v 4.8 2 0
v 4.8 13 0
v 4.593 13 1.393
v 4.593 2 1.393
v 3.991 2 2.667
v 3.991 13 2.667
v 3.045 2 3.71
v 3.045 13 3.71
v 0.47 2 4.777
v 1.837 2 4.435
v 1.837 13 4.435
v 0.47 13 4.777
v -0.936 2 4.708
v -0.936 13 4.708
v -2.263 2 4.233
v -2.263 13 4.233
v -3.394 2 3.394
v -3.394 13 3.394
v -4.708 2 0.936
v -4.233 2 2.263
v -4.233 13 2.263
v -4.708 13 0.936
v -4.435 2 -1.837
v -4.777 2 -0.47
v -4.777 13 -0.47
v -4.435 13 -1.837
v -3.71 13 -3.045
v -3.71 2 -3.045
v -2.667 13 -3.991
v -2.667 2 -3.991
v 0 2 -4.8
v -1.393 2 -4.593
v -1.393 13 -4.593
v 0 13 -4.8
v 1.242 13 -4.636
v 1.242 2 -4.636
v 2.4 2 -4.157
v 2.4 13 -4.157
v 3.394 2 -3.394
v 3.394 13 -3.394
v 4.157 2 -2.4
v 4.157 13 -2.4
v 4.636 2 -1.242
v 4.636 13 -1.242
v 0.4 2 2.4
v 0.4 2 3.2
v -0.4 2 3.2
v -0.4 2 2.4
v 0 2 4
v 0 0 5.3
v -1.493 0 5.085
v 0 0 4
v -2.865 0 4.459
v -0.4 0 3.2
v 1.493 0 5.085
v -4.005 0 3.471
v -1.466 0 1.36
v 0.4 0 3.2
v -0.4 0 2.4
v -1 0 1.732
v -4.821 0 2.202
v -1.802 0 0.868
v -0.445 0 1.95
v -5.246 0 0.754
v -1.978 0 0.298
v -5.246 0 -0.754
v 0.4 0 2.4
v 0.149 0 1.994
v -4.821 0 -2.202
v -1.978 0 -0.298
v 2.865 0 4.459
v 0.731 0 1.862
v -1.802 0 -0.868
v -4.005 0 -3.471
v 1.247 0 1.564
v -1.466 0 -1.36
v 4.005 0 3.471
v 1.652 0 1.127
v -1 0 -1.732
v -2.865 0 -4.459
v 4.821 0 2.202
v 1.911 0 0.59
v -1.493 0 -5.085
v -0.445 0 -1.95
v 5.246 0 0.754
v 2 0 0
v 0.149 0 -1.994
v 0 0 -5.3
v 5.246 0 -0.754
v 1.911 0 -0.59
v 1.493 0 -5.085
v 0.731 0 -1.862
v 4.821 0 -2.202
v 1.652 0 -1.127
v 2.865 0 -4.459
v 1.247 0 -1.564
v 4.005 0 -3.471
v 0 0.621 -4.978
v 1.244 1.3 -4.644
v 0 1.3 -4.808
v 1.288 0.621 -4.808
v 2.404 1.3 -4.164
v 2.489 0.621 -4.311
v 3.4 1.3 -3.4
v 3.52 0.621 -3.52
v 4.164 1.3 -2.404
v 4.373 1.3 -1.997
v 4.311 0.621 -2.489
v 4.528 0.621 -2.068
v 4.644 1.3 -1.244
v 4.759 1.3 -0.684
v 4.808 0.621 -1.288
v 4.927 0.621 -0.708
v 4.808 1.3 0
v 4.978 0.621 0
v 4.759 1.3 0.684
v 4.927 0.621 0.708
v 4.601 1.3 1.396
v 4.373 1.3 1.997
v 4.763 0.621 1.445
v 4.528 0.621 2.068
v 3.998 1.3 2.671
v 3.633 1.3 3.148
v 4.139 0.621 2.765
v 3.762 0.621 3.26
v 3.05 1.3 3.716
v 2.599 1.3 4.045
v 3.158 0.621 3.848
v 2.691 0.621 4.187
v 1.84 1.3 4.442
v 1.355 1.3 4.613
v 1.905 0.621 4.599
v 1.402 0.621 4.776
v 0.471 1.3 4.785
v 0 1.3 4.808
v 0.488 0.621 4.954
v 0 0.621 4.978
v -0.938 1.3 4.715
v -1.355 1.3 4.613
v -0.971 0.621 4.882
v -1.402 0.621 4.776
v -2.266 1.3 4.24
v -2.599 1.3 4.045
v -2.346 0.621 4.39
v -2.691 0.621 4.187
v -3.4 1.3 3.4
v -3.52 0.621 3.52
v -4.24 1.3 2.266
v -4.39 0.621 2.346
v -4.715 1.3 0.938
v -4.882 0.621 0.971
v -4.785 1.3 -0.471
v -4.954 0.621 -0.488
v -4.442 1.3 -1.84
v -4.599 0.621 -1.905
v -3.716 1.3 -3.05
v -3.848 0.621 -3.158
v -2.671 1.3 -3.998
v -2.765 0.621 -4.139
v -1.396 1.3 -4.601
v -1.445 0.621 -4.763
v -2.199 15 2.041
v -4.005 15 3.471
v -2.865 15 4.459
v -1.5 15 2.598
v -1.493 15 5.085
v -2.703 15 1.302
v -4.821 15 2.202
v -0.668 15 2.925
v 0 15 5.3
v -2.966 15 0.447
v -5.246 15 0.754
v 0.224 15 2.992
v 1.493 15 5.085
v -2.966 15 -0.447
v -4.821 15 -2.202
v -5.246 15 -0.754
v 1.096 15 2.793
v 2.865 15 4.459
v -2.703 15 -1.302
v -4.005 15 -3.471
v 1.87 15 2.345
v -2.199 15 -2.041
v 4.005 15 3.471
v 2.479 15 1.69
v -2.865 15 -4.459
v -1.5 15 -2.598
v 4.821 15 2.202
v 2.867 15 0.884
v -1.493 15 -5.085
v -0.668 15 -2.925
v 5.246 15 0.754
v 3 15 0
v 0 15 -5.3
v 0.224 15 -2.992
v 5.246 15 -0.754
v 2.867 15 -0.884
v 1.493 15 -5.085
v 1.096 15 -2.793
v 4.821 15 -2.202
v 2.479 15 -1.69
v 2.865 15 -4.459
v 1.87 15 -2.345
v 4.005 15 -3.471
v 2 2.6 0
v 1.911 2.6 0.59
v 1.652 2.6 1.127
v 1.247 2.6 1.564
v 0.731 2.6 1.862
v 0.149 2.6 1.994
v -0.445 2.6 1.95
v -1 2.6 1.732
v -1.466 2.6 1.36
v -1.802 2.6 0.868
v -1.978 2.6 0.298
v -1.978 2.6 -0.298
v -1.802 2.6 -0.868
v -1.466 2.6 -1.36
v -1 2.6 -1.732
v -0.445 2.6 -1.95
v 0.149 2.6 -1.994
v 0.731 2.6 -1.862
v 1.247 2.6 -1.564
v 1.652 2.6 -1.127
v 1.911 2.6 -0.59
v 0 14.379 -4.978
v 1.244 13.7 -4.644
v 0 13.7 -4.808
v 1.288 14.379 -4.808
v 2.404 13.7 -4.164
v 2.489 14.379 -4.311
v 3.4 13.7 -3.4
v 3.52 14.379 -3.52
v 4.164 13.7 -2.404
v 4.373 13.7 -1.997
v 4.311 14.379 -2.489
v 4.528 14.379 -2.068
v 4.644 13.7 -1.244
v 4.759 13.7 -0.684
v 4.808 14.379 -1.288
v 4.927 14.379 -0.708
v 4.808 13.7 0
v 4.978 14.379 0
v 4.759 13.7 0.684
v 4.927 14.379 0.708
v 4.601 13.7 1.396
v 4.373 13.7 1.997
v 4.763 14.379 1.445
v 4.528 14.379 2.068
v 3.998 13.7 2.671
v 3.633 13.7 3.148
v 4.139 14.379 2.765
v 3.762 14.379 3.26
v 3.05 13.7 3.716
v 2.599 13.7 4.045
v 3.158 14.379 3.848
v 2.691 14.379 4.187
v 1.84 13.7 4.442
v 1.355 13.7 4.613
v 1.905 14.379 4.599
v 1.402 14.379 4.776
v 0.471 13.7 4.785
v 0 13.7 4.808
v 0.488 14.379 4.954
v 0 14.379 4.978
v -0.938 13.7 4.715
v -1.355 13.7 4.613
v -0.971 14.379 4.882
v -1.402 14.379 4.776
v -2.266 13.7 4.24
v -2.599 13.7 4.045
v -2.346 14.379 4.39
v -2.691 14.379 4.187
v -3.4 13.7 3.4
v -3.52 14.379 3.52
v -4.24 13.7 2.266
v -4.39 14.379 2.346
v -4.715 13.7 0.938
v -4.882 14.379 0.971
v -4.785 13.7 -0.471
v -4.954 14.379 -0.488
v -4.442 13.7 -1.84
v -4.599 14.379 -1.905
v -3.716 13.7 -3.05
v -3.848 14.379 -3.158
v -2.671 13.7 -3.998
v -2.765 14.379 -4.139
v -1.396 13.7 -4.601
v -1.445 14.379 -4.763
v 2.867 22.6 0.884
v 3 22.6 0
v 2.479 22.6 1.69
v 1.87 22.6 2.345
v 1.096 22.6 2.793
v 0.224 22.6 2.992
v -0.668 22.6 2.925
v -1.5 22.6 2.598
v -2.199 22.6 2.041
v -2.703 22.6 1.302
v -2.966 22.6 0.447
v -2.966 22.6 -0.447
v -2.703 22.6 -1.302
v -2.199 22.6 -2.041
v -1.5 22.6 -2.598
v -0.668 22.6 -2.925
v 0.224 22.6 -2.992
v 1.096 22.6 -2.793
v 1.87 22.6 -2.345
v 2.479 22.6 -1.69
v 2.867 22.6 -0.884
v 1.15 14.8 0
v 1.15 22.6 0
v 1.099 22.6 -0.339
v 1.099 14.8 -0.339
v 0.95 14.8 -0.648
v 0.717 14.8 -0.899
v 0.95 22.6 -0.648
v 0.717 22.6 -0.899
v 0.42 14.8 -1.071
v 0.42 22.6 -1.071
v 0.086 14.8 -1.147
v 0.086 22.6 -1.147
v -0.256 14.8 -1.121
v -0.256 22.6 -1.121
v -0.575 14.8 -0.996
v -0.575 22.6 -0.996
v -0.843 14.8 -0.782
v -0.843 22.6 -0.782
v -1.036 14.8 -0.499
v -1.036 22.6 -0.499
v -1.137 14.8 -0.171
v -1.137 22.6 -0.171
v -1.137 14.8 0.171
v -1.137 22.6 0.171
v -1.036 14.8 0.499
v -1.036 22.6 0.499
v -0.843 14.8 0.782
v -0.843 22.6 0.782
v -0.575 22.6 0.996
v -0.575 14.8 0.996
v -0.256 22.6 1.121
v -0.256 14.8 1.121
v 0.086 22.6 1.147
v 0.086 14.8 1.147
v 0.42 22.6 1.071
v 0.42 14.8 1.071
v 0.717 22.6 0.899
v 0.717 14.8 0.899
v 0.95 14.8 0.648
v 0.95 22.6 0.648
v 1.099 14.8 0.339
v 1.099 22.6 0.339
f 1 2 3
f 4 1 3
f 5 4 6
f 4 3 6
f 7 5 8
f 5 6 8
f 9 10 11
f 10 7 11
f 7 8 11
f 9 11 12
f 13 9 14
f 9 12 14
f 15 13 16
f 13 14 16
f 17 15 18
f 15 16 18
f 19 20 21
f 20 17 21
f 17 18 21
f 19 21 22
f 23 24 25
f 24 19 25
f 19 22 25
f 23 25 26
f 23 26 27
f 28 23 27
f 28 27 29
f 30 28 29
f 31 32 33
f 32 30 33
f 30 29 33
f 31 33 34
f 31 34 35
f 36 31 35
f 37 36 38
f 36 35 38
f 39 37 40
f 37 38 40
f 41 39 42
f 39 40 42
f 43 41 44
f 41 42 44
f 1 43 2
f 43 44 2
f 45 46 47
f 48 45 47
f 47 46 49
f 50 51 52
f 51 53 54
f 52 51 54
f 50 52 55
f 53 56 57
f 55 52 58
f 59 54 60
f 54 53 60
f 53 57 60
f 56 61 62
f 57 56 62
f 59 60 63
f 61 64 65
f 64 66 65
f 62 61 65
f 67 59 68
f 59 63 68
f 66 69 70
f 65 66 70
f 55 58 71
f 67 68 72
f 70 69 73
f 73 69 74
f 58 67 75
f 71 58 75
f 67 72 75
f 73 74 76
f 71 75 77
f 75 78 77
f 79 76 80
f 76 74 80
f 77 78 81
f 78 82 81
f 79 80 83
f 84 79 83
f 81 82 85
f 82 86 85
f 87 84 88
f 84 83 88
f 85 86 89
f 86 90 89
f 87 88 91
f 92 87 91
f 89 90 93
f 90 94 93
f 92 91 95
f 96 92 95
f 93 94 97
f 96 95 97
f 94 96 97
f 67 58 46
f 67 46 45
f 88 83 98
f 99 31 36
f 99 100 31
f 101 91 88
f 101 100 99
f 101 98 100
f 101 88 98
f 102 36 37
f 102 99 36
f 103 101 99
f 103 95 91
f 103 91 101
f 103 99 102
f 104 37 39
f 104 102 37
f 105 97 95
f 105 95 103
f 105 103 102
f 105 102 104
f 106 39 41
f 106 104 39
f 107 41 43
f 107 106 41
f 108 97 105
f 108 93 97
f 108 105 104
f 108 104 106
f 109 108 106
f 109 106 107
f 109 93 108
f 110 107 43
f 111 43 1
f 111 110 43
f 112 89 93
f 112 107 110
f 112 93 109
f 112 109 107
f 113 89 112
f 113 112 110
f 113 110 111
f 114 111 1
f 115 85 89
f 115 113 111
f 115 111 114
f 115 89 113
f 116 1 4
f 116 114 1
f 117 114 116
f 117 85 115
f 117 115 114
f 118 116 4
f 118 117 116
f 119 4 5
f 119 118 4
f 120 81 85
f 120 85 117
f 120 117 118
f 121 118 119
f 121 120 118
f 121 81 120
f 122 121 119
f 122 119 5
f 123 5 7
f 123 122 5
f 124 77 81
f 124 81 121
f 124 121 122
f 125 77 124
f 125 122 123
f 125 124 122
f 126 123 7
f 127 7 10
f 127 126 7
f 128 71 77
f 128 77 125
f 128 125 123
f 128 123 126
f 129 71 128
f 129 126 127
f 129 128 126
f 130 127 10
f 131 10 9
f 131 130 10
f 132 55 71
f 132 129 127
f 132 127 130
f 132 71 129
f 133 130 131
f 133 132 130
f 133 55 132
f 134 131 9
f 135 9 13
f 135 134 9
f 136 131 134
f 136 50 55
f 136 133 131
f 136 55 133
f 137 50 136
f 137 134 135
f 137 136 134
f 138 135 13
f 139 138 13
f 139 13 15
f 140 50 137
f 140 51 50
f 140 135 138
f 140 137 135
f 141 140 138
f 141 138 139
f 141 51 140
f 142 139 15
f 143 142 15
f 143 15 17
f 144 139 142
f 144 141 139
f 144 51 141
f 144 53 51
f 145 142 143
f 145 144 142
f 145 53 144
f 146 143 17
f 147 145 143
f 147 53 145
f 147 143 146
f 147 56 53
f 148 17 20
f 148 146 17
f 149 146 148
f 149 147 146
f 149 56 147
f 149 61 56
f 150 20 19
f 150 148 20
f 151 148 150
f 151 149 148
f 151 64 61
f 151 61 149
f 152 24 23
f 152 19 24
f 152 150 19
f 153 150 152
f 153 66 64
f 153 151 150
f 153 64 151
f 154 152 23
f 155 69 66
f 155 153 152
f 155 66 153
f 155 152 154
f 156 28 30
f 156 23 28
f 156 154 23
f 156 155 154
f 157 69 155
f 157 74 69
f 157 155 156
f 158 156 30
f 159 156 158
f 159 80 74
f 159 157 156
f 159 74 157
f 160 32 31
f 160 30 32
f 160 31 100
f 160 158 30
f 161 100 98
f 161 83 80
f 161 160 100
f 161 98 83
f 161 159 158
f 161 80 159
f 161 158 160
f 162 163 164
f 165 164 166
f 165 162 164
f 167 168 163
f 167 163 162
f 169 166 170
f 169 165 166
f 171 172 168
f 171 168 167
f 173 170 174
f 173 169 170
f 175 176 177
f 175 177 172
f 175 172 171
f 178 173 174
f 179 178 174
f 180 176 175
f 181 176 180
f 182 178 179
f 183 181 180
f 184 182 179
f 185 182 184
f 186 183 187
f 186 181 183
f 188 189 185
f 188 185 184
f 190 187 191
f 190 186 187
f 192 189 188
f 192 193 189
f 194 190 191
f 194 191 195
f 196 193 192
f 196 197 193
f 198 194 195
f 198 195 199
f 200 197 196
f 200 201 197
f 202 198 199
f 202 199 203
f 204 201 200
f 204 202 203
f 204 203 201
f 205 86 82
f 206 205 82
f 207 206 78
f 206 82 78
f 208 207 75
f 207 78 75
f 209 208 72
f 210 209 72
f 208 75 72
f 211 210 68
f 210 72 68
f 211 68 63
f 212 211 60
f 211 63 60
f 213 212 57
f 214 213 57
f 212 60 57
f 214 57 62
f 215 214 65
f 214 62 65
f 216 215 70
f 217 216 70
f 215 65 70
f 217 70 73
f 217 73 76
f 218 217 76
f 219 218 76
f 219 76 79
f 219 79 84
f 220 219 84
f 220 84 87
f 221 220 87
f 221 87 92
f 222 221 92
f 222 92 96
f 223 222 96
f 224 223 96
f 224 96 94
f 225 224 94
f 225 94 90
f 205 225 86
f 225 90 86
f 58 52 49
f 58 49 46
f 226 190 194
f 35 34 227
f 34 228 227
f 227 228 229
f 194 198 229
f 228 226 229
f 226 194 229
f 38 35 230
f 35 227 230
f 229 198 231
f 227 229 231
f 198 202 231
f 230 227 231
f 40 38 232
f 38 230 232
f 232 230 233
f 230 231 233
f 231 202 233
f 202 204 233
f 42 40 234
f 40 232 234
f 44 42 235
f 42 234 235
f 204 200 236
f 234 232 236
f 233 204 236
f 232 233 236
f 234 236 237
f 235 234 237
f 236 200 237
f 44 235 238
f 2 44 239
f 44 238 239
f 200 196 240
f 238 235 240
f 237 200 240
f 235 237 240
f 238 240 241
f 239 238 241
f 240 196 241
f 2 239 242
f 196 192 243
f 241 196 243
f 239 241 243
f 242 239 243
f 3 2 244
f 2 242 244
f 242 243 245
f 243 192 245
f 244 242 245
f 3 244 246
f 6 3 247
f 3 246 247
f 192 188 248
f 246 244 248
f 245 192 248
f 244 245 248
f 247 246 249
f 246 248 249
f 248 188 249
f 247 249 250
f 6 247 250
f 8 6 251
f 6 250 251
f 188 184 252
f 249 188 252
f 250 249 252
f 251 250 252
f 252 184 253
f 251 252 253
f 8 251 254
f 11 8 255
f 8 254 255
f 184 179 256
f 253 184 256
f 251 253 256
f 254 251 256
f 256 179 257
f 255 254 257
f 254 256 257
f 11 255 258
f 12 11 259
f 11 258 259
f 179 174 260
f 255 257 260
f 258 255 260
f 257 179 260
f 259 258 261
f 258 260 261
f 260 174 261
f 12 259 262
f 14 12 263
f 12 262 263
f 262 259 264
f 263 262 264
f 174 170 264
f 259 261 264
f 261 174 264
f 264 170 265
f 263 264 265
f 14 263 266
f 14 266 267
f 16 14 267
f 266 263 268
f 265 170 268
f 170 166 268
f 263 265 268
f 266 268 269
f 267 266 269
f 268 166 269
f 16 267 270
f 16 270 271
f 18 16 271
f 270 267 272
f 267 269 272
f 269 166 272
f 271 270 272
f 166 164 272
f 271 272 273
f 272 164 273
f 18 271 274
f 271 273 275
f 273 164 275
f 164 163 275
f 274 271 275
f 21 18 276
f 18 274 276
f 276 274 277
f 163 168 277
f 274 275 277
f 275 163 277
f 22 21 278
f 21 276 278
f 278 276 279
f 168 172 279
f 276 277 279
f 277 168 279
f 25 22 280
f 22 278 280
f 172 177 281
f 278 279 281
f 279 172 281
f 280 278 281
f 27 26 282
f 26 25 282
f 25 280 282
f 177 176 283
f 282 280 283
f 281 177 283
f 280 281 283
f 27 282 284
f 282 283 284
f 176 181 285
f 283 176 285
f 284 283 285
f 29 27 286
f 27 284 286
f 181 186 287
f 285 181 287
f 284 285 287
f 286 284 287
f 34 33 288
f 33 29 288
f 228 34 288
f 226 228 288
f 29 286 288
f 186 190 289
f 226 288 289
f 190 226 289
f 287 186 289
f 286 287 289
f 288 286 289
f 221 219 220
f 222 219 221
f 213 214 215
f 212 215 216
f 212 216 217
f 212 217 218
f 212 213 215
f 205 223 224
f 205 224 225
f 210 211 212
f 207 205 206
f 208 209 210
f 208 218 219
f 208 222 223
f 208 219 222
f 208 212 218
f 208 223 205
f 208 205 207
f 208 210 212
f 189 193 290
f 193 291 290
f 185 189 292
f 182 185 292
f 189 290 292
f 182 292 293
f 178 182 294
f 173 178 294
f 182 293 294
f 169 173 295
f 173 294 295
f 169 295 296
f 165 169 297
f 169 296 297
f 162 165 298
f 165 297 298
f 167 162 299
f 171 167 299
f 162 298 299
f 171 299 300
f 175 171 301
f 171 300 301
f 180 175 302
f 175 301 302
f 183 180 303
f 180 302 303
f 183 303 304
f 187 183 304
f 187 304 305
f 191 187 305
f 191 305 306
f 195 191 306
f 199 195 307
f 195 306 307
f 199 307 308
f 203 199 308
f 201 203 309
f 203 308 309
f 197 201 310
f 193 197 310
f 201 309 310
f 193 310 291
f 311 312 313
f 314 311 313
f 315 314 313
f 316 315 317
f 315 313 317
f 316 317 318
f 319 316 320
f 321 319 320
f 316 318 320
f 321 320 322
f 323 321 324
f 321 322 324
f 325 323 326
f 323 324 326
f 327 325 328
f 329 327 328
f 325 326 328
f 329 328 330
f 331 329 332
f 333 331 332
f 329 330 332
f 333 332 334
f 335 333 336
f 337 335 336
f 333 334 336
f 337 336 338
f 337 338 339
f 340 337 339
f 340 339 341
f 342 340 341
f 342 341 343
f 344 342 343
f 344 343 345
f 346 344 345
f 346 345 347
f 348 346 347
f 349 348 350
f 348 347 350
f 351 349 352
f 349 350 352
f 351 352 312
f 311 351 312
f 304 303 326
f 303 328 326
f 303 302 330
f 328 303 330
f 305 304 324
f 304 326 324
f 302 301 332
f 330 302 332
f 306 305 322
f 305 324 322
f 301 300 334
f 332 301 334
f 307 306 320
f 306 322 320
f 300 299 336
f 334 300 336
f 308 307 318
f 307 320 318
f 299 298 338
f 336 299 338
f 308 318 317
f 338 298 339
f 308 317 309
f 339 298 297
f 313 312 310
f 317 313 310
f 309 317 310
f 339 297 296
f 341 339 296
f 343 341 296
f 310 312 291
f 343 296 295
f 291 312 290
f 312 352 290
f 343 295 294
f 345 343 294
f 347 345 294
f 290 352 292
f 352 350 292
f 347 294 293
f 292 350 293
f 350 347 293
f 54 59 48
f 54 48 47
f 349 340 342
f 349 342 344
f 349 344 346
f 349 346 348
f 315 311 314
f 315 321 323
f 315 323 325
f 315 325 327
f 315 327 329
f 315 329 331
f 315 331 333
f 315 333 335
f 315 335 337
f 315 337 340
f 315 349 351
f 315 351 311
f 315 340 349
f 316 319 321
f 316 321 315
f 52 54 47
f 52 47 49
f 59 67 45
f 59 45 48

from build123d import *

# Parameters (mm, degrees)
CROQUIS7_R              = 5.3
SALIENTE_EXTRUIR1_DEPTH = 2
CORTAR_EXTRUIR1_START   = 7.6
CROQUIS3_R              = 1.15
CORTAR_EXTRUIR1_DEPTH   = 7.8
CROQUIS4_R              = 2
CORTAR_EXTRUIR2_DEPTH   = 2.6
CORTAR_EXTRUIR4_DEPTH   = 2


with BuildPart() as part:
    # Croquis1 → Revolución2 (revolve)
    with BuildSketch(Plane.XY):
        Polygon((4.8, 15), (3, 15), (3, 22.6), (0, 22.6), (0, 0), (4.8, 0), align=None)
    revolve(axis=Axis((0, 55, 0), (0, -1, 0)))

    # Croquis7 → Saliente-Extruir1 (add)
    with BuildSketch(Plane(origin=(0, 15, 0), x_dir=(1, 0, 0), z_dir=(0, 1, 0))):
        Circle(CROQUIS7_R)
    saliente_extruir1 = extrude(amount=-SALIENTE_EXTRUIR1_DEPTH)

    # Croquis3 → Cortar-Extruir1 (cut)
    with BuildSketch(Plane(origin=(0, 15, 0), x_dir=(1, 0, 0), z_dir=(0, 1, 0)).offset(CORTAR_EXTRUIR1_START)):
        Circle(CROQUIS3_R)
    extrude(amount=-CORTAR_EXTRUIR1_DEPTH, mode=Mode.SUBTRACT)

    # Croquis8 → Cortar-Revolución2 (revolve, cut)
    with BuildSketch(Plane(origin=(0, 0, 0), x_dir=(0, 0, -1), z_dir=(1, 0, 0))):
        with BuildLine():
            Line((5.3, 15), (5.3, 13))
            Line((5.3, 13), (4.8, 13))
            ThreePointArc((4.8, 13), (4.872810183, 14.044297454), (5.3, 15))
        make_face()
    cortar_revoluci_n2 = revolve(axis=Axis((0, 55, 0), (0, -1, 0)), mode=Mode.SUBTRACT)

    # Simetría1: Saliente-Extruir1, Cortar-Revolución2 across plane
    add(saliente_extruir1.mirror(Plane(origin=(0, 7.5, 0), x_dir=(0, 0, 1), z_dir=(0, -1, 0))))
    add(cortar_revoluci_n2.mirror(Plane(origin=(0, 7.5, 0), x_dir=(0, 0, 1), z_dir=(0, -1, 0))), mode=Mode.SUBTRACT)

    # Croquis4 → Cortar-Extruir2 (cut)
    with BuildSketch(Plane.XZ):
        Circle(CROQUIS4_R)
    extrude(amount=-CORTAR_EXTRUIR2_DEPTH, mode=Mode.SUBTRACT)

    # Croquis9 → Cortar-Extruir4 (cut)
    with BuildSketch(Plane.XZ):
        Polygon((-0.4, 3.2), (0, 4), (0.4, 3.2), (0.4, 2.4), (-0.4, 2.4), align=None)
    extrude(amount=-CORTAR_EXTRUIR4_DEPTH, mode=Mode.SUBTRACT)


solid = part.part
